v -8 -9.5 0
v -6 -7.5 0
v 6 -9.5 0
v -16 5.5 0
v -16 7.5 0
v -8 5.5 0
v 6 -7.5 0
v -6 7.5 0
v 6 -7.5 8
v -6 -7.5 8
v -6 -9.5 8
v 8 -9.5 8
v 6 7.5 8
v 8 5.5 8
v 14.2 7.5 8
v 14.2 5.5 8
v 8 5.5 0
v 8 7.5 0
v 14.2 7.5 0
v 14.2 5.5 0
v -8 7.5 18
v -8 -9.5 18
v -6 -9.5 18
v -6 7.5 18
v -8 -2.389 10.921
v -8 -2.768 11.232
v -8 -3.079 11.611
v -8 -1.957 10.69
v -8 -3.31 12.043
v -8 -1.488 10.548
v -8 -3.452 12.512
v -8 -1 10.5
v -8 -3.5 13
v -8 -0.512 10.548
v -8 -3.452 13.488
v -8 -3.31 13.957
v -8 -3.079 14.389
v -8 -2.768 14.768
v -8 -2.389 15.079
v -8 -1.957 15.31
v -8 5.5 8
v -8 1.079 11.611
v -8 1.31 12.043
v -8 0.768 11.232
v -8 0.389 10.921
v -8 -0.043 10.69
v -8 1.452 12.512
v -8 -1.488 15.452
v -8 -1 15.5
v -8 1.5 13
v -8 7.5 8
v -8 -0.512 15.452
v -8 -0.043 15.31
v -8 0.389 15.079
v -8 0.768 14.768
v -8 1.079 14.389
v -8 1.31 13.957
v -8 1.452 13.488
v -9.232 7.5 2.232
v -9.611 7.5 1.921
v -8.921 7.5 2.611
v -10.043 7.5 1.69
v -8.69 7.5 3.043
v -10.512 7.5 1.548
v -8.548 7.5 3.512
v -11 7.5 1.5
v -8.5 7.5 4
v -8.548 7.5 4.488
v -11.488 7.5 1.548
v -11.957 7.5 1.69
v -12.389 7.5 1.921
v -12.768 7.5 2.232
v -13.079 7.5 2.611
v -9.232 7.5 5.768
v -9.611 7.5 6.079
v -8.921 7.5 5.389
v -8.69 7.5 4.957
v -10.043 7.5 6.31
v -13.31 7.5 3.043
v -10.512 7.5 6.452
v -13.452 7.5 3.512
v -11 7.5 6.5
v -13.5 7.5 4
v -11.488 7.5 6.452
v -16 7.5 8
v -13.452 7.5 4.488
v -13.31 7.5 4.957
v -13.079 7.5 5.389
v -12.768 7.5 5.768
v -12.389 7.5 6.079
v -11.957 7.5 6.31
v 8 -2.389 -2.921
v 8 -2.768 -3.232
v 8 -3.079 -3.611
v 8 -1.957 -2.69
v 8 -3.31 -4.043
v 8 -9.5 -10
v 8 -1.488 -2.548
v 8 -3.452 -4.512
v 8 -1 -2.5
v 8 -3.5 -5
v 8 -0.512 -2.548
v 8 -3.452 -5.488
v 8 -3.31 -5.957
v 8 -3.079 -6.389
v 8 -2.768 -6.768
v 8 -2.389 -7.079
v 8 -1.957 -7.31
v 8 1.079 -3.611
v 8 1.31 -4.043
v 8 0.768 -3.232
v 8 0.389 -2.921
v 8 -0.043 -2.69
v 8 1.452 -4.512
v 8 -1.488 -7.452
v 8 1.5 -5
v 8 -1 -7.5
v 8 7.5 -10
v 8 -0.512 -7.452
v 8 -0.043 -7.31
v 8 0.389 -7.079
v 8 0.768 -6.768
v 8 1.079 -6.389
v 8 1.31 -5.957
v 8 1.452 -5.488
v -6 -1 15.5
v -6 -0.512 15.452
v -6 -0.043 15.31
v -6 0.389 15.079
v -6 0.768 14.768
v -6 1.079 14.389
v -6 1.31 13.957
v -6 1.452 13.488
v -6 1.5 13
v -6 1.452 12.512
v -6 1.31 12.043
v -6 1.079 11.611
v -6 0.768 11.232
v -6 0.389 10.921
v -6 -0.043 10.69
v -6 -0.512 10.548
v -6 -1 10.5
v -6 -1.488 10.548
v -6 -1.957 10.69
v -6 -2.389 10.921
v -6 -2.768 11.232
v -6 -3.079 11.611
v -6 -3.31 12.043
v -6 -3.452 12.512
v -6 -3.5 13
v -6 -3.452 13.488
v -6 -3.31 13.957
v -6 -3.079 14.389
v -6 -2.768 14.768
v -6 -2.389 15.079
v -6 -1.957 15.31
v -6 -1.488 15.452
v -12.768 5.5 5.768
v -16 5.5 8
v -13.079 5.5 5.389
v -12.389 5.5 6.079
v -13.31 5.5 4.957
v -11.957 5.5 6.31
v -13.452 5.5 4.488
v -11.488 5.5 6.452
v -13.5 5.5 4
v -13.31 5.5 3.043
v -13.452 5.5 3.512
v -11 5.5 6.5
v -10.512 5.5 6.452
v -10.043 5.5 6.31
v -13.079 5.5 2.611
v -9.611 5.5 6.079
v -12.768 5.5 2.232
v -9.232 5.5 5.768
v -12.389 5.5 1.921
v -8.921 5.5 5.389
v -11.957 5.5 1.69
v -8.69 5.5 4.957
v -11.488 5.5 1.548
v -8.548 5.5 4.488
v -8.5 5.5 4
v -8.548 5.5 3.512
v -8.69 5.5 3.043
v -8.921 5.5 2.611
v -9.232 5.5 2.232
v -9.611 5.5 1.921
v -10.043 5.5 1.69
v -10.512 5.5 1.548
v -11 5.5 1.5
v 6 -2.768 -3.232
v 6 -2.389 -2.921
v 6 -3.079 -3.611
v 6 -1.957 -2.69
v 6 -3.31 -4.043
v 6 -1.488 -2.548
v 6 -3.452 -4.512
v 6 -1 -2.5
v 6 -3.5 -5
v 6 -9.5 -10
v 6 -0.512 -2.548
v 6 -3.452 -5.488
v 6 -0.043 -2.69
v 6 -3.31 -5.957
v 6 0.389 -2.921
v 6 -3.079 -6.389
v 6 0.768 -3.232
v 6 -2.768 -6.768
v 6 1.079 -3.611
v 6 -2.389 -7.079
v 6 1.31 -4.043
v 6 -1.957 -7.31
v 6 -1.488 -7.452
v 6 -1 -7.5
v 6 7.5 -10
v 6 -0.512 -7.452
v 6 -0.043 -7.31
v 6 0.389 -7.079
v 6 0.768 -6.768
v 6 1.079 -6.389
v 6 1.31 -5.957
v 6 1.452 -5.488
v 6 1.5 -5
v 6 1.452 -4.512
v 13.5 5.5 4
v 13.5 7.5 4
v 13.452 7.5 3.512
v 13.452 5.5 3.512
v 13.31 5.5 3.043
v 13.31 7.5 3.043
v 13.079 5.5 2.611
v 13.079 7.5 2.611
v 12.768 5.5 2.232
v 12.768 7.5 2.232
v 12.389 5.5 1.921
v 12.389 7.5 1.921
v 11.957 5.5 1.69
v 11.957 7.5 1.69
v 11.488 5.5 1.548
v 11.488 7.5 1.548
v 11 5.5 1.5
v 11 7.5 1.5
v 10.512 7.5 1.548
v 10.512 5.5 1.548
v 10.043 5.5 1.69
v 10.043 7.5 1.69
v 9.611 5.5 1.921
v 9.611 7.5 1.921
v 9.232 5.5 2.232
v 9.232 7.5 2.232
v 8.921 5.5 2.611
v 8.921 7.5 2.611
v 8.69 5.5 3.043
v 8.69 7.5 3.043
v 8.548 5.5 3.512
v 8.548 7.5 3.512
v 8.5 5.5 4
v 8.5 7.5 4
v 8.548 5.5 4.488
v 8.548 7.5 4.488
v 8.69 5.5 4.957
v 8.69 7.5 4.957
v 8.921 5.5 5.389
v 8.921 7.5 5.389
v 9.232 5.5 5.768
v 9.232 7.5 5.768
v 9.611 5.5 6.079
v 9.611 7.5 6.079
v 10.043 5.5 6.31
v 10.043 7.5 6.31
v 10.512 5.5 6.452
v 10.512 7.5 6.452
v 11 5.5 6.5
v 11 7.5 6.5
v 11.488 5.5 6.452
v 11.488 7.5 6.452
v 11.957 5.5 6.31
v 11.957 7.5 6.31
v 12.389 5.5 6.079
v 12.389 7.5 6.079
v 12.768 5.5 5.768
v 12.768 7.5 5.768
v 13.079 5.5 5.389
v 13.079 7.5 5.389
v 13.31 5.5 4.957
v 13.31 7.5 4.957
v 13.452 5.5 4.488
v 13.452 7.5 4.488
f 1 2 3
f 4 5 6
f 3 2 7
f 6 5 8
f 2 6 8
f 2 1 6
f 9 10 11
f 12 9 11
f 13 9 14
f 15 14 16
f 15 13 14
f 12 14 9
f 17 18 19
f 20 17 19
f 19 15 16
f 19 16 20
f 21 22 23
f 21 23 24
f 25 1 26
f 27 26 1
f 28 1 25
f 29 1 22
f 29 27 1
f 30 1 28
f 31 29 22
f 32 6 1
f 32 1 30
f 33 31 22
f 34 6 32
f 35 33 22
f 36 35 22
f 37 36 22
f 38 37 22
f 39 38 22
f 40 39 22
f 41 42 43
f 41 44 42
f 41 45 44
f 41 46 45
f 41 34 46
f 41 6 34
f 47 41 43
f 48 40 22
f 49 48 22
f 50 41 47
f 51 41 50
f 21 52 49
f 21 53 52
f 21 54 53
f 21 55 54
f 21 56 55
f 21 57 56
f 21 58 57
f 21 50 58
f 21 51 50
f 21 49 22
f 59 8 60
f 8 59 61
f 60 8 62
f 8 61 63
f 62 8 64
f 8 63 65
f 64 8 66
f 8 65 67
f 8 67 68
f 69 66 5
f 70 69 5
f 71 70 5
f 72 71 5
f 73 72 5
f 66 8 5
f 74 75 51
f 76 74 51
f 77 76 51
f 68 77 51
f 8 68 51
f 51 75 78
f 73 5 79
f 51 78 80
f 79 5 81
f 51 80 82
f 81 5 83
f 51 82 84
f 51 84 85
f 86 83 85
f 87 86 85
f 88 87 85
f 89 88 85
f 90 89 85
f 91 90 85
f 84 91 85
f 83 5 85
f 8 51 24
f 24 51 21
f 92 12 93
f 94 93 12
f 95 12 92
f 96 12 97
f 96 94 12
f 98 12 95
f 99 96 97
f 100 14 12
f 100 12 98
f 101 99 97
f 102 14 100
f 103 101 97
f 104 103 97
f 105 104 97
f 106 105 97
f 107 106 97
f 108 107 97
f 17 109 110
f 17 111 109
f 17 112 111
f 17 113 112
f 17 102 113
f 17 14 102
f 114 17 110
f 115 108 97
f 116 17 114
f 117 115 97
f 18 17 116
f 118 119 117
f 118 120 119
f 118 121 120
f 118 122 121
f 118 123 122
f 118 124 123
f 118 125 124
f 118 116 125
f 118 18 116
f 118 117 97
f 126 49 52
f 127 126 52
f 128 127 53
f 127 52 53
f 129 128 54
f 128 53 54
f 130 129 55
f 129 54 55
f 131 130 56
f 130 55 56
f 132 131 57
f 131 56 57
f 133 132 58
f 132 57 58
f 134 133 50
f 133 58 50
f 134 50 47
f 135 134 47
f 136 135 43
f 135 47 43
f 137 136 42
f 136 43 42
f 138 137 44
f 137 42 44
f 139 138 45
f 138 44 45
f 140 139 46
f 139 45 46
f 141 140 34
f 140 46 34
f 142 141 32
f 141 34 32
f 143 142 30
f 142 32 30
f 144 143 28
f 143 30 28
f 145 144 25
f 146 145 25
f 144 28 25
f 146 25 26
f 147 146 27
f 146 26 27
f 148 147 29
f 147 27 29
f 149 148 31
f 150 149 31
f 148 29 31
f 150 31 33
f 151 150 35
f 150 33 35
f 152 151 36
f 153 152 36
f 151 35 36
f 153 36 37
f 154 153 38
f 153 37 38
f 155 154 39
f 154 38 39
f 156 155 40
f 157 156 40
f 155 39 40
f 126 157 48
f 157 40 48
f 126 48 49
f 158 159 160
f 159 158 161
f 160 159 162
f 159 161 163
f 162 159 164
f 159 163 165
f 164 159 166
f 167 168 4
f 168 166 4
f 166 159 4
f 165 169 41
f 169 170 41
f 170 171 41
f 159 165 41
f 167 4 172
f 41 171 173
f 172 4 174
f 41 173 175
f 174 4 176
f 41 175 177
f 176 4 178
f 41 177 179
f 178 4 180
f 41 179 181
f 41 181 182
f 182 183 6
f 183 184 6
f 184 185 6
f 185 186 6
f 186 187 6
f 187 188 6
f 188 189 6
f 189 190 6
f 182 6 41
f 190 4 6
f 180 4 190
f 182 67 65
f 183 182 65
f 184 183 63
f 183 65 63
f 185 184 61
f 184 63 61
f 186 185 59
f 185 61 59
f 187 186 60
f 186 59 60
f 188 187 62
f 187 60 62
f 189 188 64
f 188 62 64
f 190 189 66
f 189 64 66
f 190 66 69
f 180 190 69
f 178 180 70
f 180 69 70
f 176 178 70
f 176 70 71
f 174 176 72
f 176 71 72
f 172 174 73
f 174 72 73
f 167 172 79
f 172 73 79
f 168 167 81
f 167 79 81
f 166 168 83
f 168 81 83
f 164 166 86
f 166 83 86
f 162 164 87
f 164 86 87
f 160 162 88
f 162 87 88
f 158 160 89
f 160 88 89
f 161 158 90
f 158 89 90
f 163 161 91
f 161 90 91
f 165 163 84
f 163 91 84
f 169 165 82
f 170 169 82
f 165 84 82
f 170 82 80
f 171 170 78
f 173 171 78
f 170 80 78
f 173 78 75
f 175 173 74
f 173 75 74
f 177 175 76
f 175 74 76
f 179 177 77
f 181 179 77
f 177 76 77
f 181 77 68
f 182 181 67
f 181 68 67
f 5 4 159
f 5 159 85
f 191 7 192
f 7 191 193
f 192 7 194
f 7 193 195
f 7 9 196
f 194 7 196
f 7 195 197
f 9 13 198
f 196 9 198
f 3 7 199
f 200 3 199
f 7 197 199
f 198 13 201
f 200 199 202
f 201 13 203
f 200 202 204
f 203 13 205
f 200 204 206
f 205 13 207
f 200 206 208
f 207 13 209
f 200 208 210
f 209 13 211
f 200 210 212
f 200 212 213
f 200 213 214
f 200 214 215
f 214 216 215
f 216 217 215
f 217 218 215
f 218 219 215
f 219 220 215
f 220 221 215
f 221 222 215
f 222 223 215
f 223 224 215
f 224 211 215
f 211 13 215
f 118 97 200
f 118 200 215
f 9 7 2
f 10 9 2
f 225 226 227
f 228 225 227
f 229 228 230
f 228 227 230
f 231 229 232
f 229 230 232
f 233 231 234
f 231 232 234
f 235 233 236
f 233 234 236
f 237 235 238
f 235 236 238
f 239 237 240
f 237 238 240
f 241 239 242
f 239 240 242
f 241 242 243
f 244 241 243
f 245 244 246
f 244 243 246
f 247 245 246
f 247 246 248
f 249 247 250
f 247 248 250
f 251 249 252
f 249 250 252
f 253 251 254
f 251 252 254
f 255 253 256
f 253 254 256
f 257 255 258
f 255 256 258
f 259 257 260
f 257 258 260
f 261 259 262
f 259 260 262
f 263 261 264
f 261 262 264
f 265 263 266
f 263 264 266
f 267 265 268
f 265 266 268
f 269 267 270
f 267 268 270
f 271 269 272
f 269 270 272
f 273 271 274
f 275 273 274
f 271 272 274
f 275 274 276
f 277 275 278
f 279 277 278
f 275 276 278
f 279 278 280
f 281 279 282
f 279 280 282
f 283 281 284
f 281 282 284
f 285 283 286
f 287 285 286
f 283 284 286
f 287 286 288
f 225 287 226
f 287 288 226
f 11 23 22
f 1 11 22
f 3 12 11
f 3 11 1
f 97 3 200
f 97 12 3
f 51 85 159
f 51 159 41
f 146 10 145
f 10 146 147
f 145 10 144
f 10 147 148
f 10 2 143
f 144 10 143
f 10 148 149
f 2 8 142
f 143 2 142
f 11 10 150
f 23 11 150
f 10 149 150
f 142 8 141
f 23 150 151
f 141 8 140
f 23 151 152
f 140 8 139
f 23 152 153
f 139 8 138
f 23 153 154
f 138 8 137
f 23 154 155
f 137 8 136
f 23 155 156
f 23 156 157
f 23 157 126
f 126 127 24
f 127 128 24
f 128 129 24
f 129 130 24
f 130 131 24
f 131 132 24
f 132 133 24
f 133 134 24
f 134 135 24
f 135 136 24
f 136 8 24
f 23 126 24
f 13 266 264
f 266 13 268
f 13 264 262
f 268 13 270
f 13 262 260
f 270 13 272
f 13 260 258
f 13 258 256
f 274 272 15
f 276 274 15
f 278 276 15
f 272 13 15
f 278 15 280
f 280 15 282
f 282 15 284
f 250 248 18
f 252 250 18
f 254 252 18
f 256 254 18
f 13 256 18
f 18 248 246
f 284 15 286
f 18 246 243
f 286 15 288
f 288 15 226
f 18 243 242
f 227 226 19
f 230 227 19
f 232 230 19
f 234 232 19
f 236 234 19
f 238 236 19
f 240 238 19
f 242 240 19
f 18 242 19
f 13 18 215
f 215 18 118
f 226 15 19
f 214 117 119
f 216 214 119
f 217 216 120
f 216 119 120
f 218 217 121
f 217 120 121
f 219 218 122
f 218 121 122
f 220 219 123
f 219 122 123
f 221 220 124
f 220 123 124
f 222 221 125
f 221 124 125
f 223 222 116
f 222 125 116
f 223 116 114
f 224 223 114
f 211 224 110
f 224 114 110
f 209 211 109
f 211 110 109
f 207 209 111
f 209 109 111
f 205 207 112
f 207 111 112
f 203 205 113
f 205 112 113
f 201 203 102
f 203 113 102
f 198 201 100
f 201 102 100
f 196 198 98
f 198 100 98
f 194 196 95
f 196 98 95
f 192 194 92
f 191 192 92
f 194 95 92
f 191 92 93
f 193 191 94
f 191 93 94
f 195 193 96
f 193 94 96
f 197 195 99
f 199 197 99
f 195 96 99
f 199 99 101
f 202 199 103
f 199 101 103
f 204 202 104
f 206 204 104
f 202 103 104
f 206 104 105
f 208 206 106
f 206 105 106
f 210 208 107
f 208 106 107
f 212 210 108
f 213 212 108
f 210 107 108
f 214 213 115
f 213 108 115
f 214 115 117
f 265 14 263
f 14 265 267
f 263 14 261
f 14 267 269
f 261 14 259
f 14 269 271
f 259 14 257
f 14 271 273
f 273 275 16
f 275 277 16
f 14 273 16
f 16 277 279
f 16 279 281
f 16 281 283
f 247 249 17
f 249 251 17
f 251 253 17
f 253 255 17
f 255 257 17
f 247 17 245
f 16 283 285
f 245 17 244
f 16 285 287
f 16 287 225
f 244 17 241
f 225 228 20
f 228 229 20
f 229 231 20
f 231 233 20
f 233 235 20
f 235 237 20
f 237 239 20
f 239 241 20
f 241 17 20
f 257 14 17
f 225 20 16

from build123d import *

# Parameters (mm, degrees)
CROQUIS1_W              = 8
CROQUIS1_H              = 2
SALIENTE_EXTRUIR1_DEPTH = 8
CROQUIS2_R              = 2.5
CORTAR_EXTRUIR1_DEPTH   = 2
SKETCH1_W               = 8
SKETCH1_H               = 2
CUT_EXTRUDE1_DEPTH      = 1.8
SKETCH5_W               = 10
SKETCH5_H               = 17
BOSS_EXTRUDE3_DEPTH     = 2
SKETCH6_W               = 10
SKETCH6_H               = 17
SKETCH6_R               = 2.5
BOSS_EXTRUDE4_DEPTH     = 2
SKETCH7_R               = 2.5
CUT_EXTRUDE2_DEPTH      = 2


with BuildPart() as part:
    # Croquis1 → Saliente-Extruir1 (new body)
    with BuildSketch(Plane.XY):
        with Locations((-12, 6.5)):
            Rectangle(CROQUIS1_W, CROQUIS1_H)
        Polygon((-6, 7.5), (-8, 7.5), (-8, 5.5), (-8, -9.5), (8, -9.5), (8, 5.5), (8, 7.5), (6, 7.5), (6, -7.5), (-6, -7.5), align=None)
        with Locations((12, 6.5)):
            Rectangle(CROQUIS1_W, CROQUIS1_H)
    extrude(amount=SALIENTE_EXTRUIR1_DEPTH)

    # Croquis2 → Cortar-Extruir1 (cut)
    with BuildSketch(Plane(origin=(0, 7.5, 0), x_dir=(1, 0, 0), z_dir=(0, 1, 0))):
        with Locations((-11, -4)):
            Circle(CROQUIS2_R)
        with Locations((11, -4)):
            Circle(CROQUIS2_R)
    extrude(amount=-CORTAR_EXTRUIR1_DEPTH, mode=Mode.SUBTRACT)

    # Sketch1 → Cut-Extrude1 (cut)
    with BuildSketch(Plane(origin=(16, 0, 0), x_dir=(0, 0, -1), z_dir=(1, 0, 0))):
        with Locations((-4, 6.5)):
            Rectangle(SKETCH1_W, SKETCH1_H)
    extrude(amount=-CUT_EXTRUDE1_DEPTH, mode=Mode.SUBTRACT)

    # Sketch5 → Boss-Extrude3 (add)
    with BuildSketch(Plane.ZY.offset(8)):
        with Locations((13, -1)):
            Rectangle(SKETCH5_W, SKETCH5_H)
    extrude(amount=-BOSS_EXTRUDE3_DEPTH)

    # Sketch6 → Boss-Extrude4 (add)
    with BuildSketch(Plane(origin=(8, 0, 0), x_dir=(0, 0, -1), z_dir=(1, 0, 0))):
        with Locations((5, -1)):
            Rectangle(SKETCH6_W, SKETCH6_H)
        with Locations((5, -1)):
            Circle(SKETCH6_R, mode=Mode.SUBTRACT)
    extrude(amount=-BOSS_EXTRUDE4_DEPTH)

    # Sketch7 → Cut-Extrude2 (cut)
    with BuildSketch(Plane.ZY.offset(8)):
        with Locations((13, -1)):
            Circle(SKETCH7_R)
    extrude(amount=-CUT_EXTRUDE2_DEPTH, mode=Mode.SUBTRACT)


solid = part.part
